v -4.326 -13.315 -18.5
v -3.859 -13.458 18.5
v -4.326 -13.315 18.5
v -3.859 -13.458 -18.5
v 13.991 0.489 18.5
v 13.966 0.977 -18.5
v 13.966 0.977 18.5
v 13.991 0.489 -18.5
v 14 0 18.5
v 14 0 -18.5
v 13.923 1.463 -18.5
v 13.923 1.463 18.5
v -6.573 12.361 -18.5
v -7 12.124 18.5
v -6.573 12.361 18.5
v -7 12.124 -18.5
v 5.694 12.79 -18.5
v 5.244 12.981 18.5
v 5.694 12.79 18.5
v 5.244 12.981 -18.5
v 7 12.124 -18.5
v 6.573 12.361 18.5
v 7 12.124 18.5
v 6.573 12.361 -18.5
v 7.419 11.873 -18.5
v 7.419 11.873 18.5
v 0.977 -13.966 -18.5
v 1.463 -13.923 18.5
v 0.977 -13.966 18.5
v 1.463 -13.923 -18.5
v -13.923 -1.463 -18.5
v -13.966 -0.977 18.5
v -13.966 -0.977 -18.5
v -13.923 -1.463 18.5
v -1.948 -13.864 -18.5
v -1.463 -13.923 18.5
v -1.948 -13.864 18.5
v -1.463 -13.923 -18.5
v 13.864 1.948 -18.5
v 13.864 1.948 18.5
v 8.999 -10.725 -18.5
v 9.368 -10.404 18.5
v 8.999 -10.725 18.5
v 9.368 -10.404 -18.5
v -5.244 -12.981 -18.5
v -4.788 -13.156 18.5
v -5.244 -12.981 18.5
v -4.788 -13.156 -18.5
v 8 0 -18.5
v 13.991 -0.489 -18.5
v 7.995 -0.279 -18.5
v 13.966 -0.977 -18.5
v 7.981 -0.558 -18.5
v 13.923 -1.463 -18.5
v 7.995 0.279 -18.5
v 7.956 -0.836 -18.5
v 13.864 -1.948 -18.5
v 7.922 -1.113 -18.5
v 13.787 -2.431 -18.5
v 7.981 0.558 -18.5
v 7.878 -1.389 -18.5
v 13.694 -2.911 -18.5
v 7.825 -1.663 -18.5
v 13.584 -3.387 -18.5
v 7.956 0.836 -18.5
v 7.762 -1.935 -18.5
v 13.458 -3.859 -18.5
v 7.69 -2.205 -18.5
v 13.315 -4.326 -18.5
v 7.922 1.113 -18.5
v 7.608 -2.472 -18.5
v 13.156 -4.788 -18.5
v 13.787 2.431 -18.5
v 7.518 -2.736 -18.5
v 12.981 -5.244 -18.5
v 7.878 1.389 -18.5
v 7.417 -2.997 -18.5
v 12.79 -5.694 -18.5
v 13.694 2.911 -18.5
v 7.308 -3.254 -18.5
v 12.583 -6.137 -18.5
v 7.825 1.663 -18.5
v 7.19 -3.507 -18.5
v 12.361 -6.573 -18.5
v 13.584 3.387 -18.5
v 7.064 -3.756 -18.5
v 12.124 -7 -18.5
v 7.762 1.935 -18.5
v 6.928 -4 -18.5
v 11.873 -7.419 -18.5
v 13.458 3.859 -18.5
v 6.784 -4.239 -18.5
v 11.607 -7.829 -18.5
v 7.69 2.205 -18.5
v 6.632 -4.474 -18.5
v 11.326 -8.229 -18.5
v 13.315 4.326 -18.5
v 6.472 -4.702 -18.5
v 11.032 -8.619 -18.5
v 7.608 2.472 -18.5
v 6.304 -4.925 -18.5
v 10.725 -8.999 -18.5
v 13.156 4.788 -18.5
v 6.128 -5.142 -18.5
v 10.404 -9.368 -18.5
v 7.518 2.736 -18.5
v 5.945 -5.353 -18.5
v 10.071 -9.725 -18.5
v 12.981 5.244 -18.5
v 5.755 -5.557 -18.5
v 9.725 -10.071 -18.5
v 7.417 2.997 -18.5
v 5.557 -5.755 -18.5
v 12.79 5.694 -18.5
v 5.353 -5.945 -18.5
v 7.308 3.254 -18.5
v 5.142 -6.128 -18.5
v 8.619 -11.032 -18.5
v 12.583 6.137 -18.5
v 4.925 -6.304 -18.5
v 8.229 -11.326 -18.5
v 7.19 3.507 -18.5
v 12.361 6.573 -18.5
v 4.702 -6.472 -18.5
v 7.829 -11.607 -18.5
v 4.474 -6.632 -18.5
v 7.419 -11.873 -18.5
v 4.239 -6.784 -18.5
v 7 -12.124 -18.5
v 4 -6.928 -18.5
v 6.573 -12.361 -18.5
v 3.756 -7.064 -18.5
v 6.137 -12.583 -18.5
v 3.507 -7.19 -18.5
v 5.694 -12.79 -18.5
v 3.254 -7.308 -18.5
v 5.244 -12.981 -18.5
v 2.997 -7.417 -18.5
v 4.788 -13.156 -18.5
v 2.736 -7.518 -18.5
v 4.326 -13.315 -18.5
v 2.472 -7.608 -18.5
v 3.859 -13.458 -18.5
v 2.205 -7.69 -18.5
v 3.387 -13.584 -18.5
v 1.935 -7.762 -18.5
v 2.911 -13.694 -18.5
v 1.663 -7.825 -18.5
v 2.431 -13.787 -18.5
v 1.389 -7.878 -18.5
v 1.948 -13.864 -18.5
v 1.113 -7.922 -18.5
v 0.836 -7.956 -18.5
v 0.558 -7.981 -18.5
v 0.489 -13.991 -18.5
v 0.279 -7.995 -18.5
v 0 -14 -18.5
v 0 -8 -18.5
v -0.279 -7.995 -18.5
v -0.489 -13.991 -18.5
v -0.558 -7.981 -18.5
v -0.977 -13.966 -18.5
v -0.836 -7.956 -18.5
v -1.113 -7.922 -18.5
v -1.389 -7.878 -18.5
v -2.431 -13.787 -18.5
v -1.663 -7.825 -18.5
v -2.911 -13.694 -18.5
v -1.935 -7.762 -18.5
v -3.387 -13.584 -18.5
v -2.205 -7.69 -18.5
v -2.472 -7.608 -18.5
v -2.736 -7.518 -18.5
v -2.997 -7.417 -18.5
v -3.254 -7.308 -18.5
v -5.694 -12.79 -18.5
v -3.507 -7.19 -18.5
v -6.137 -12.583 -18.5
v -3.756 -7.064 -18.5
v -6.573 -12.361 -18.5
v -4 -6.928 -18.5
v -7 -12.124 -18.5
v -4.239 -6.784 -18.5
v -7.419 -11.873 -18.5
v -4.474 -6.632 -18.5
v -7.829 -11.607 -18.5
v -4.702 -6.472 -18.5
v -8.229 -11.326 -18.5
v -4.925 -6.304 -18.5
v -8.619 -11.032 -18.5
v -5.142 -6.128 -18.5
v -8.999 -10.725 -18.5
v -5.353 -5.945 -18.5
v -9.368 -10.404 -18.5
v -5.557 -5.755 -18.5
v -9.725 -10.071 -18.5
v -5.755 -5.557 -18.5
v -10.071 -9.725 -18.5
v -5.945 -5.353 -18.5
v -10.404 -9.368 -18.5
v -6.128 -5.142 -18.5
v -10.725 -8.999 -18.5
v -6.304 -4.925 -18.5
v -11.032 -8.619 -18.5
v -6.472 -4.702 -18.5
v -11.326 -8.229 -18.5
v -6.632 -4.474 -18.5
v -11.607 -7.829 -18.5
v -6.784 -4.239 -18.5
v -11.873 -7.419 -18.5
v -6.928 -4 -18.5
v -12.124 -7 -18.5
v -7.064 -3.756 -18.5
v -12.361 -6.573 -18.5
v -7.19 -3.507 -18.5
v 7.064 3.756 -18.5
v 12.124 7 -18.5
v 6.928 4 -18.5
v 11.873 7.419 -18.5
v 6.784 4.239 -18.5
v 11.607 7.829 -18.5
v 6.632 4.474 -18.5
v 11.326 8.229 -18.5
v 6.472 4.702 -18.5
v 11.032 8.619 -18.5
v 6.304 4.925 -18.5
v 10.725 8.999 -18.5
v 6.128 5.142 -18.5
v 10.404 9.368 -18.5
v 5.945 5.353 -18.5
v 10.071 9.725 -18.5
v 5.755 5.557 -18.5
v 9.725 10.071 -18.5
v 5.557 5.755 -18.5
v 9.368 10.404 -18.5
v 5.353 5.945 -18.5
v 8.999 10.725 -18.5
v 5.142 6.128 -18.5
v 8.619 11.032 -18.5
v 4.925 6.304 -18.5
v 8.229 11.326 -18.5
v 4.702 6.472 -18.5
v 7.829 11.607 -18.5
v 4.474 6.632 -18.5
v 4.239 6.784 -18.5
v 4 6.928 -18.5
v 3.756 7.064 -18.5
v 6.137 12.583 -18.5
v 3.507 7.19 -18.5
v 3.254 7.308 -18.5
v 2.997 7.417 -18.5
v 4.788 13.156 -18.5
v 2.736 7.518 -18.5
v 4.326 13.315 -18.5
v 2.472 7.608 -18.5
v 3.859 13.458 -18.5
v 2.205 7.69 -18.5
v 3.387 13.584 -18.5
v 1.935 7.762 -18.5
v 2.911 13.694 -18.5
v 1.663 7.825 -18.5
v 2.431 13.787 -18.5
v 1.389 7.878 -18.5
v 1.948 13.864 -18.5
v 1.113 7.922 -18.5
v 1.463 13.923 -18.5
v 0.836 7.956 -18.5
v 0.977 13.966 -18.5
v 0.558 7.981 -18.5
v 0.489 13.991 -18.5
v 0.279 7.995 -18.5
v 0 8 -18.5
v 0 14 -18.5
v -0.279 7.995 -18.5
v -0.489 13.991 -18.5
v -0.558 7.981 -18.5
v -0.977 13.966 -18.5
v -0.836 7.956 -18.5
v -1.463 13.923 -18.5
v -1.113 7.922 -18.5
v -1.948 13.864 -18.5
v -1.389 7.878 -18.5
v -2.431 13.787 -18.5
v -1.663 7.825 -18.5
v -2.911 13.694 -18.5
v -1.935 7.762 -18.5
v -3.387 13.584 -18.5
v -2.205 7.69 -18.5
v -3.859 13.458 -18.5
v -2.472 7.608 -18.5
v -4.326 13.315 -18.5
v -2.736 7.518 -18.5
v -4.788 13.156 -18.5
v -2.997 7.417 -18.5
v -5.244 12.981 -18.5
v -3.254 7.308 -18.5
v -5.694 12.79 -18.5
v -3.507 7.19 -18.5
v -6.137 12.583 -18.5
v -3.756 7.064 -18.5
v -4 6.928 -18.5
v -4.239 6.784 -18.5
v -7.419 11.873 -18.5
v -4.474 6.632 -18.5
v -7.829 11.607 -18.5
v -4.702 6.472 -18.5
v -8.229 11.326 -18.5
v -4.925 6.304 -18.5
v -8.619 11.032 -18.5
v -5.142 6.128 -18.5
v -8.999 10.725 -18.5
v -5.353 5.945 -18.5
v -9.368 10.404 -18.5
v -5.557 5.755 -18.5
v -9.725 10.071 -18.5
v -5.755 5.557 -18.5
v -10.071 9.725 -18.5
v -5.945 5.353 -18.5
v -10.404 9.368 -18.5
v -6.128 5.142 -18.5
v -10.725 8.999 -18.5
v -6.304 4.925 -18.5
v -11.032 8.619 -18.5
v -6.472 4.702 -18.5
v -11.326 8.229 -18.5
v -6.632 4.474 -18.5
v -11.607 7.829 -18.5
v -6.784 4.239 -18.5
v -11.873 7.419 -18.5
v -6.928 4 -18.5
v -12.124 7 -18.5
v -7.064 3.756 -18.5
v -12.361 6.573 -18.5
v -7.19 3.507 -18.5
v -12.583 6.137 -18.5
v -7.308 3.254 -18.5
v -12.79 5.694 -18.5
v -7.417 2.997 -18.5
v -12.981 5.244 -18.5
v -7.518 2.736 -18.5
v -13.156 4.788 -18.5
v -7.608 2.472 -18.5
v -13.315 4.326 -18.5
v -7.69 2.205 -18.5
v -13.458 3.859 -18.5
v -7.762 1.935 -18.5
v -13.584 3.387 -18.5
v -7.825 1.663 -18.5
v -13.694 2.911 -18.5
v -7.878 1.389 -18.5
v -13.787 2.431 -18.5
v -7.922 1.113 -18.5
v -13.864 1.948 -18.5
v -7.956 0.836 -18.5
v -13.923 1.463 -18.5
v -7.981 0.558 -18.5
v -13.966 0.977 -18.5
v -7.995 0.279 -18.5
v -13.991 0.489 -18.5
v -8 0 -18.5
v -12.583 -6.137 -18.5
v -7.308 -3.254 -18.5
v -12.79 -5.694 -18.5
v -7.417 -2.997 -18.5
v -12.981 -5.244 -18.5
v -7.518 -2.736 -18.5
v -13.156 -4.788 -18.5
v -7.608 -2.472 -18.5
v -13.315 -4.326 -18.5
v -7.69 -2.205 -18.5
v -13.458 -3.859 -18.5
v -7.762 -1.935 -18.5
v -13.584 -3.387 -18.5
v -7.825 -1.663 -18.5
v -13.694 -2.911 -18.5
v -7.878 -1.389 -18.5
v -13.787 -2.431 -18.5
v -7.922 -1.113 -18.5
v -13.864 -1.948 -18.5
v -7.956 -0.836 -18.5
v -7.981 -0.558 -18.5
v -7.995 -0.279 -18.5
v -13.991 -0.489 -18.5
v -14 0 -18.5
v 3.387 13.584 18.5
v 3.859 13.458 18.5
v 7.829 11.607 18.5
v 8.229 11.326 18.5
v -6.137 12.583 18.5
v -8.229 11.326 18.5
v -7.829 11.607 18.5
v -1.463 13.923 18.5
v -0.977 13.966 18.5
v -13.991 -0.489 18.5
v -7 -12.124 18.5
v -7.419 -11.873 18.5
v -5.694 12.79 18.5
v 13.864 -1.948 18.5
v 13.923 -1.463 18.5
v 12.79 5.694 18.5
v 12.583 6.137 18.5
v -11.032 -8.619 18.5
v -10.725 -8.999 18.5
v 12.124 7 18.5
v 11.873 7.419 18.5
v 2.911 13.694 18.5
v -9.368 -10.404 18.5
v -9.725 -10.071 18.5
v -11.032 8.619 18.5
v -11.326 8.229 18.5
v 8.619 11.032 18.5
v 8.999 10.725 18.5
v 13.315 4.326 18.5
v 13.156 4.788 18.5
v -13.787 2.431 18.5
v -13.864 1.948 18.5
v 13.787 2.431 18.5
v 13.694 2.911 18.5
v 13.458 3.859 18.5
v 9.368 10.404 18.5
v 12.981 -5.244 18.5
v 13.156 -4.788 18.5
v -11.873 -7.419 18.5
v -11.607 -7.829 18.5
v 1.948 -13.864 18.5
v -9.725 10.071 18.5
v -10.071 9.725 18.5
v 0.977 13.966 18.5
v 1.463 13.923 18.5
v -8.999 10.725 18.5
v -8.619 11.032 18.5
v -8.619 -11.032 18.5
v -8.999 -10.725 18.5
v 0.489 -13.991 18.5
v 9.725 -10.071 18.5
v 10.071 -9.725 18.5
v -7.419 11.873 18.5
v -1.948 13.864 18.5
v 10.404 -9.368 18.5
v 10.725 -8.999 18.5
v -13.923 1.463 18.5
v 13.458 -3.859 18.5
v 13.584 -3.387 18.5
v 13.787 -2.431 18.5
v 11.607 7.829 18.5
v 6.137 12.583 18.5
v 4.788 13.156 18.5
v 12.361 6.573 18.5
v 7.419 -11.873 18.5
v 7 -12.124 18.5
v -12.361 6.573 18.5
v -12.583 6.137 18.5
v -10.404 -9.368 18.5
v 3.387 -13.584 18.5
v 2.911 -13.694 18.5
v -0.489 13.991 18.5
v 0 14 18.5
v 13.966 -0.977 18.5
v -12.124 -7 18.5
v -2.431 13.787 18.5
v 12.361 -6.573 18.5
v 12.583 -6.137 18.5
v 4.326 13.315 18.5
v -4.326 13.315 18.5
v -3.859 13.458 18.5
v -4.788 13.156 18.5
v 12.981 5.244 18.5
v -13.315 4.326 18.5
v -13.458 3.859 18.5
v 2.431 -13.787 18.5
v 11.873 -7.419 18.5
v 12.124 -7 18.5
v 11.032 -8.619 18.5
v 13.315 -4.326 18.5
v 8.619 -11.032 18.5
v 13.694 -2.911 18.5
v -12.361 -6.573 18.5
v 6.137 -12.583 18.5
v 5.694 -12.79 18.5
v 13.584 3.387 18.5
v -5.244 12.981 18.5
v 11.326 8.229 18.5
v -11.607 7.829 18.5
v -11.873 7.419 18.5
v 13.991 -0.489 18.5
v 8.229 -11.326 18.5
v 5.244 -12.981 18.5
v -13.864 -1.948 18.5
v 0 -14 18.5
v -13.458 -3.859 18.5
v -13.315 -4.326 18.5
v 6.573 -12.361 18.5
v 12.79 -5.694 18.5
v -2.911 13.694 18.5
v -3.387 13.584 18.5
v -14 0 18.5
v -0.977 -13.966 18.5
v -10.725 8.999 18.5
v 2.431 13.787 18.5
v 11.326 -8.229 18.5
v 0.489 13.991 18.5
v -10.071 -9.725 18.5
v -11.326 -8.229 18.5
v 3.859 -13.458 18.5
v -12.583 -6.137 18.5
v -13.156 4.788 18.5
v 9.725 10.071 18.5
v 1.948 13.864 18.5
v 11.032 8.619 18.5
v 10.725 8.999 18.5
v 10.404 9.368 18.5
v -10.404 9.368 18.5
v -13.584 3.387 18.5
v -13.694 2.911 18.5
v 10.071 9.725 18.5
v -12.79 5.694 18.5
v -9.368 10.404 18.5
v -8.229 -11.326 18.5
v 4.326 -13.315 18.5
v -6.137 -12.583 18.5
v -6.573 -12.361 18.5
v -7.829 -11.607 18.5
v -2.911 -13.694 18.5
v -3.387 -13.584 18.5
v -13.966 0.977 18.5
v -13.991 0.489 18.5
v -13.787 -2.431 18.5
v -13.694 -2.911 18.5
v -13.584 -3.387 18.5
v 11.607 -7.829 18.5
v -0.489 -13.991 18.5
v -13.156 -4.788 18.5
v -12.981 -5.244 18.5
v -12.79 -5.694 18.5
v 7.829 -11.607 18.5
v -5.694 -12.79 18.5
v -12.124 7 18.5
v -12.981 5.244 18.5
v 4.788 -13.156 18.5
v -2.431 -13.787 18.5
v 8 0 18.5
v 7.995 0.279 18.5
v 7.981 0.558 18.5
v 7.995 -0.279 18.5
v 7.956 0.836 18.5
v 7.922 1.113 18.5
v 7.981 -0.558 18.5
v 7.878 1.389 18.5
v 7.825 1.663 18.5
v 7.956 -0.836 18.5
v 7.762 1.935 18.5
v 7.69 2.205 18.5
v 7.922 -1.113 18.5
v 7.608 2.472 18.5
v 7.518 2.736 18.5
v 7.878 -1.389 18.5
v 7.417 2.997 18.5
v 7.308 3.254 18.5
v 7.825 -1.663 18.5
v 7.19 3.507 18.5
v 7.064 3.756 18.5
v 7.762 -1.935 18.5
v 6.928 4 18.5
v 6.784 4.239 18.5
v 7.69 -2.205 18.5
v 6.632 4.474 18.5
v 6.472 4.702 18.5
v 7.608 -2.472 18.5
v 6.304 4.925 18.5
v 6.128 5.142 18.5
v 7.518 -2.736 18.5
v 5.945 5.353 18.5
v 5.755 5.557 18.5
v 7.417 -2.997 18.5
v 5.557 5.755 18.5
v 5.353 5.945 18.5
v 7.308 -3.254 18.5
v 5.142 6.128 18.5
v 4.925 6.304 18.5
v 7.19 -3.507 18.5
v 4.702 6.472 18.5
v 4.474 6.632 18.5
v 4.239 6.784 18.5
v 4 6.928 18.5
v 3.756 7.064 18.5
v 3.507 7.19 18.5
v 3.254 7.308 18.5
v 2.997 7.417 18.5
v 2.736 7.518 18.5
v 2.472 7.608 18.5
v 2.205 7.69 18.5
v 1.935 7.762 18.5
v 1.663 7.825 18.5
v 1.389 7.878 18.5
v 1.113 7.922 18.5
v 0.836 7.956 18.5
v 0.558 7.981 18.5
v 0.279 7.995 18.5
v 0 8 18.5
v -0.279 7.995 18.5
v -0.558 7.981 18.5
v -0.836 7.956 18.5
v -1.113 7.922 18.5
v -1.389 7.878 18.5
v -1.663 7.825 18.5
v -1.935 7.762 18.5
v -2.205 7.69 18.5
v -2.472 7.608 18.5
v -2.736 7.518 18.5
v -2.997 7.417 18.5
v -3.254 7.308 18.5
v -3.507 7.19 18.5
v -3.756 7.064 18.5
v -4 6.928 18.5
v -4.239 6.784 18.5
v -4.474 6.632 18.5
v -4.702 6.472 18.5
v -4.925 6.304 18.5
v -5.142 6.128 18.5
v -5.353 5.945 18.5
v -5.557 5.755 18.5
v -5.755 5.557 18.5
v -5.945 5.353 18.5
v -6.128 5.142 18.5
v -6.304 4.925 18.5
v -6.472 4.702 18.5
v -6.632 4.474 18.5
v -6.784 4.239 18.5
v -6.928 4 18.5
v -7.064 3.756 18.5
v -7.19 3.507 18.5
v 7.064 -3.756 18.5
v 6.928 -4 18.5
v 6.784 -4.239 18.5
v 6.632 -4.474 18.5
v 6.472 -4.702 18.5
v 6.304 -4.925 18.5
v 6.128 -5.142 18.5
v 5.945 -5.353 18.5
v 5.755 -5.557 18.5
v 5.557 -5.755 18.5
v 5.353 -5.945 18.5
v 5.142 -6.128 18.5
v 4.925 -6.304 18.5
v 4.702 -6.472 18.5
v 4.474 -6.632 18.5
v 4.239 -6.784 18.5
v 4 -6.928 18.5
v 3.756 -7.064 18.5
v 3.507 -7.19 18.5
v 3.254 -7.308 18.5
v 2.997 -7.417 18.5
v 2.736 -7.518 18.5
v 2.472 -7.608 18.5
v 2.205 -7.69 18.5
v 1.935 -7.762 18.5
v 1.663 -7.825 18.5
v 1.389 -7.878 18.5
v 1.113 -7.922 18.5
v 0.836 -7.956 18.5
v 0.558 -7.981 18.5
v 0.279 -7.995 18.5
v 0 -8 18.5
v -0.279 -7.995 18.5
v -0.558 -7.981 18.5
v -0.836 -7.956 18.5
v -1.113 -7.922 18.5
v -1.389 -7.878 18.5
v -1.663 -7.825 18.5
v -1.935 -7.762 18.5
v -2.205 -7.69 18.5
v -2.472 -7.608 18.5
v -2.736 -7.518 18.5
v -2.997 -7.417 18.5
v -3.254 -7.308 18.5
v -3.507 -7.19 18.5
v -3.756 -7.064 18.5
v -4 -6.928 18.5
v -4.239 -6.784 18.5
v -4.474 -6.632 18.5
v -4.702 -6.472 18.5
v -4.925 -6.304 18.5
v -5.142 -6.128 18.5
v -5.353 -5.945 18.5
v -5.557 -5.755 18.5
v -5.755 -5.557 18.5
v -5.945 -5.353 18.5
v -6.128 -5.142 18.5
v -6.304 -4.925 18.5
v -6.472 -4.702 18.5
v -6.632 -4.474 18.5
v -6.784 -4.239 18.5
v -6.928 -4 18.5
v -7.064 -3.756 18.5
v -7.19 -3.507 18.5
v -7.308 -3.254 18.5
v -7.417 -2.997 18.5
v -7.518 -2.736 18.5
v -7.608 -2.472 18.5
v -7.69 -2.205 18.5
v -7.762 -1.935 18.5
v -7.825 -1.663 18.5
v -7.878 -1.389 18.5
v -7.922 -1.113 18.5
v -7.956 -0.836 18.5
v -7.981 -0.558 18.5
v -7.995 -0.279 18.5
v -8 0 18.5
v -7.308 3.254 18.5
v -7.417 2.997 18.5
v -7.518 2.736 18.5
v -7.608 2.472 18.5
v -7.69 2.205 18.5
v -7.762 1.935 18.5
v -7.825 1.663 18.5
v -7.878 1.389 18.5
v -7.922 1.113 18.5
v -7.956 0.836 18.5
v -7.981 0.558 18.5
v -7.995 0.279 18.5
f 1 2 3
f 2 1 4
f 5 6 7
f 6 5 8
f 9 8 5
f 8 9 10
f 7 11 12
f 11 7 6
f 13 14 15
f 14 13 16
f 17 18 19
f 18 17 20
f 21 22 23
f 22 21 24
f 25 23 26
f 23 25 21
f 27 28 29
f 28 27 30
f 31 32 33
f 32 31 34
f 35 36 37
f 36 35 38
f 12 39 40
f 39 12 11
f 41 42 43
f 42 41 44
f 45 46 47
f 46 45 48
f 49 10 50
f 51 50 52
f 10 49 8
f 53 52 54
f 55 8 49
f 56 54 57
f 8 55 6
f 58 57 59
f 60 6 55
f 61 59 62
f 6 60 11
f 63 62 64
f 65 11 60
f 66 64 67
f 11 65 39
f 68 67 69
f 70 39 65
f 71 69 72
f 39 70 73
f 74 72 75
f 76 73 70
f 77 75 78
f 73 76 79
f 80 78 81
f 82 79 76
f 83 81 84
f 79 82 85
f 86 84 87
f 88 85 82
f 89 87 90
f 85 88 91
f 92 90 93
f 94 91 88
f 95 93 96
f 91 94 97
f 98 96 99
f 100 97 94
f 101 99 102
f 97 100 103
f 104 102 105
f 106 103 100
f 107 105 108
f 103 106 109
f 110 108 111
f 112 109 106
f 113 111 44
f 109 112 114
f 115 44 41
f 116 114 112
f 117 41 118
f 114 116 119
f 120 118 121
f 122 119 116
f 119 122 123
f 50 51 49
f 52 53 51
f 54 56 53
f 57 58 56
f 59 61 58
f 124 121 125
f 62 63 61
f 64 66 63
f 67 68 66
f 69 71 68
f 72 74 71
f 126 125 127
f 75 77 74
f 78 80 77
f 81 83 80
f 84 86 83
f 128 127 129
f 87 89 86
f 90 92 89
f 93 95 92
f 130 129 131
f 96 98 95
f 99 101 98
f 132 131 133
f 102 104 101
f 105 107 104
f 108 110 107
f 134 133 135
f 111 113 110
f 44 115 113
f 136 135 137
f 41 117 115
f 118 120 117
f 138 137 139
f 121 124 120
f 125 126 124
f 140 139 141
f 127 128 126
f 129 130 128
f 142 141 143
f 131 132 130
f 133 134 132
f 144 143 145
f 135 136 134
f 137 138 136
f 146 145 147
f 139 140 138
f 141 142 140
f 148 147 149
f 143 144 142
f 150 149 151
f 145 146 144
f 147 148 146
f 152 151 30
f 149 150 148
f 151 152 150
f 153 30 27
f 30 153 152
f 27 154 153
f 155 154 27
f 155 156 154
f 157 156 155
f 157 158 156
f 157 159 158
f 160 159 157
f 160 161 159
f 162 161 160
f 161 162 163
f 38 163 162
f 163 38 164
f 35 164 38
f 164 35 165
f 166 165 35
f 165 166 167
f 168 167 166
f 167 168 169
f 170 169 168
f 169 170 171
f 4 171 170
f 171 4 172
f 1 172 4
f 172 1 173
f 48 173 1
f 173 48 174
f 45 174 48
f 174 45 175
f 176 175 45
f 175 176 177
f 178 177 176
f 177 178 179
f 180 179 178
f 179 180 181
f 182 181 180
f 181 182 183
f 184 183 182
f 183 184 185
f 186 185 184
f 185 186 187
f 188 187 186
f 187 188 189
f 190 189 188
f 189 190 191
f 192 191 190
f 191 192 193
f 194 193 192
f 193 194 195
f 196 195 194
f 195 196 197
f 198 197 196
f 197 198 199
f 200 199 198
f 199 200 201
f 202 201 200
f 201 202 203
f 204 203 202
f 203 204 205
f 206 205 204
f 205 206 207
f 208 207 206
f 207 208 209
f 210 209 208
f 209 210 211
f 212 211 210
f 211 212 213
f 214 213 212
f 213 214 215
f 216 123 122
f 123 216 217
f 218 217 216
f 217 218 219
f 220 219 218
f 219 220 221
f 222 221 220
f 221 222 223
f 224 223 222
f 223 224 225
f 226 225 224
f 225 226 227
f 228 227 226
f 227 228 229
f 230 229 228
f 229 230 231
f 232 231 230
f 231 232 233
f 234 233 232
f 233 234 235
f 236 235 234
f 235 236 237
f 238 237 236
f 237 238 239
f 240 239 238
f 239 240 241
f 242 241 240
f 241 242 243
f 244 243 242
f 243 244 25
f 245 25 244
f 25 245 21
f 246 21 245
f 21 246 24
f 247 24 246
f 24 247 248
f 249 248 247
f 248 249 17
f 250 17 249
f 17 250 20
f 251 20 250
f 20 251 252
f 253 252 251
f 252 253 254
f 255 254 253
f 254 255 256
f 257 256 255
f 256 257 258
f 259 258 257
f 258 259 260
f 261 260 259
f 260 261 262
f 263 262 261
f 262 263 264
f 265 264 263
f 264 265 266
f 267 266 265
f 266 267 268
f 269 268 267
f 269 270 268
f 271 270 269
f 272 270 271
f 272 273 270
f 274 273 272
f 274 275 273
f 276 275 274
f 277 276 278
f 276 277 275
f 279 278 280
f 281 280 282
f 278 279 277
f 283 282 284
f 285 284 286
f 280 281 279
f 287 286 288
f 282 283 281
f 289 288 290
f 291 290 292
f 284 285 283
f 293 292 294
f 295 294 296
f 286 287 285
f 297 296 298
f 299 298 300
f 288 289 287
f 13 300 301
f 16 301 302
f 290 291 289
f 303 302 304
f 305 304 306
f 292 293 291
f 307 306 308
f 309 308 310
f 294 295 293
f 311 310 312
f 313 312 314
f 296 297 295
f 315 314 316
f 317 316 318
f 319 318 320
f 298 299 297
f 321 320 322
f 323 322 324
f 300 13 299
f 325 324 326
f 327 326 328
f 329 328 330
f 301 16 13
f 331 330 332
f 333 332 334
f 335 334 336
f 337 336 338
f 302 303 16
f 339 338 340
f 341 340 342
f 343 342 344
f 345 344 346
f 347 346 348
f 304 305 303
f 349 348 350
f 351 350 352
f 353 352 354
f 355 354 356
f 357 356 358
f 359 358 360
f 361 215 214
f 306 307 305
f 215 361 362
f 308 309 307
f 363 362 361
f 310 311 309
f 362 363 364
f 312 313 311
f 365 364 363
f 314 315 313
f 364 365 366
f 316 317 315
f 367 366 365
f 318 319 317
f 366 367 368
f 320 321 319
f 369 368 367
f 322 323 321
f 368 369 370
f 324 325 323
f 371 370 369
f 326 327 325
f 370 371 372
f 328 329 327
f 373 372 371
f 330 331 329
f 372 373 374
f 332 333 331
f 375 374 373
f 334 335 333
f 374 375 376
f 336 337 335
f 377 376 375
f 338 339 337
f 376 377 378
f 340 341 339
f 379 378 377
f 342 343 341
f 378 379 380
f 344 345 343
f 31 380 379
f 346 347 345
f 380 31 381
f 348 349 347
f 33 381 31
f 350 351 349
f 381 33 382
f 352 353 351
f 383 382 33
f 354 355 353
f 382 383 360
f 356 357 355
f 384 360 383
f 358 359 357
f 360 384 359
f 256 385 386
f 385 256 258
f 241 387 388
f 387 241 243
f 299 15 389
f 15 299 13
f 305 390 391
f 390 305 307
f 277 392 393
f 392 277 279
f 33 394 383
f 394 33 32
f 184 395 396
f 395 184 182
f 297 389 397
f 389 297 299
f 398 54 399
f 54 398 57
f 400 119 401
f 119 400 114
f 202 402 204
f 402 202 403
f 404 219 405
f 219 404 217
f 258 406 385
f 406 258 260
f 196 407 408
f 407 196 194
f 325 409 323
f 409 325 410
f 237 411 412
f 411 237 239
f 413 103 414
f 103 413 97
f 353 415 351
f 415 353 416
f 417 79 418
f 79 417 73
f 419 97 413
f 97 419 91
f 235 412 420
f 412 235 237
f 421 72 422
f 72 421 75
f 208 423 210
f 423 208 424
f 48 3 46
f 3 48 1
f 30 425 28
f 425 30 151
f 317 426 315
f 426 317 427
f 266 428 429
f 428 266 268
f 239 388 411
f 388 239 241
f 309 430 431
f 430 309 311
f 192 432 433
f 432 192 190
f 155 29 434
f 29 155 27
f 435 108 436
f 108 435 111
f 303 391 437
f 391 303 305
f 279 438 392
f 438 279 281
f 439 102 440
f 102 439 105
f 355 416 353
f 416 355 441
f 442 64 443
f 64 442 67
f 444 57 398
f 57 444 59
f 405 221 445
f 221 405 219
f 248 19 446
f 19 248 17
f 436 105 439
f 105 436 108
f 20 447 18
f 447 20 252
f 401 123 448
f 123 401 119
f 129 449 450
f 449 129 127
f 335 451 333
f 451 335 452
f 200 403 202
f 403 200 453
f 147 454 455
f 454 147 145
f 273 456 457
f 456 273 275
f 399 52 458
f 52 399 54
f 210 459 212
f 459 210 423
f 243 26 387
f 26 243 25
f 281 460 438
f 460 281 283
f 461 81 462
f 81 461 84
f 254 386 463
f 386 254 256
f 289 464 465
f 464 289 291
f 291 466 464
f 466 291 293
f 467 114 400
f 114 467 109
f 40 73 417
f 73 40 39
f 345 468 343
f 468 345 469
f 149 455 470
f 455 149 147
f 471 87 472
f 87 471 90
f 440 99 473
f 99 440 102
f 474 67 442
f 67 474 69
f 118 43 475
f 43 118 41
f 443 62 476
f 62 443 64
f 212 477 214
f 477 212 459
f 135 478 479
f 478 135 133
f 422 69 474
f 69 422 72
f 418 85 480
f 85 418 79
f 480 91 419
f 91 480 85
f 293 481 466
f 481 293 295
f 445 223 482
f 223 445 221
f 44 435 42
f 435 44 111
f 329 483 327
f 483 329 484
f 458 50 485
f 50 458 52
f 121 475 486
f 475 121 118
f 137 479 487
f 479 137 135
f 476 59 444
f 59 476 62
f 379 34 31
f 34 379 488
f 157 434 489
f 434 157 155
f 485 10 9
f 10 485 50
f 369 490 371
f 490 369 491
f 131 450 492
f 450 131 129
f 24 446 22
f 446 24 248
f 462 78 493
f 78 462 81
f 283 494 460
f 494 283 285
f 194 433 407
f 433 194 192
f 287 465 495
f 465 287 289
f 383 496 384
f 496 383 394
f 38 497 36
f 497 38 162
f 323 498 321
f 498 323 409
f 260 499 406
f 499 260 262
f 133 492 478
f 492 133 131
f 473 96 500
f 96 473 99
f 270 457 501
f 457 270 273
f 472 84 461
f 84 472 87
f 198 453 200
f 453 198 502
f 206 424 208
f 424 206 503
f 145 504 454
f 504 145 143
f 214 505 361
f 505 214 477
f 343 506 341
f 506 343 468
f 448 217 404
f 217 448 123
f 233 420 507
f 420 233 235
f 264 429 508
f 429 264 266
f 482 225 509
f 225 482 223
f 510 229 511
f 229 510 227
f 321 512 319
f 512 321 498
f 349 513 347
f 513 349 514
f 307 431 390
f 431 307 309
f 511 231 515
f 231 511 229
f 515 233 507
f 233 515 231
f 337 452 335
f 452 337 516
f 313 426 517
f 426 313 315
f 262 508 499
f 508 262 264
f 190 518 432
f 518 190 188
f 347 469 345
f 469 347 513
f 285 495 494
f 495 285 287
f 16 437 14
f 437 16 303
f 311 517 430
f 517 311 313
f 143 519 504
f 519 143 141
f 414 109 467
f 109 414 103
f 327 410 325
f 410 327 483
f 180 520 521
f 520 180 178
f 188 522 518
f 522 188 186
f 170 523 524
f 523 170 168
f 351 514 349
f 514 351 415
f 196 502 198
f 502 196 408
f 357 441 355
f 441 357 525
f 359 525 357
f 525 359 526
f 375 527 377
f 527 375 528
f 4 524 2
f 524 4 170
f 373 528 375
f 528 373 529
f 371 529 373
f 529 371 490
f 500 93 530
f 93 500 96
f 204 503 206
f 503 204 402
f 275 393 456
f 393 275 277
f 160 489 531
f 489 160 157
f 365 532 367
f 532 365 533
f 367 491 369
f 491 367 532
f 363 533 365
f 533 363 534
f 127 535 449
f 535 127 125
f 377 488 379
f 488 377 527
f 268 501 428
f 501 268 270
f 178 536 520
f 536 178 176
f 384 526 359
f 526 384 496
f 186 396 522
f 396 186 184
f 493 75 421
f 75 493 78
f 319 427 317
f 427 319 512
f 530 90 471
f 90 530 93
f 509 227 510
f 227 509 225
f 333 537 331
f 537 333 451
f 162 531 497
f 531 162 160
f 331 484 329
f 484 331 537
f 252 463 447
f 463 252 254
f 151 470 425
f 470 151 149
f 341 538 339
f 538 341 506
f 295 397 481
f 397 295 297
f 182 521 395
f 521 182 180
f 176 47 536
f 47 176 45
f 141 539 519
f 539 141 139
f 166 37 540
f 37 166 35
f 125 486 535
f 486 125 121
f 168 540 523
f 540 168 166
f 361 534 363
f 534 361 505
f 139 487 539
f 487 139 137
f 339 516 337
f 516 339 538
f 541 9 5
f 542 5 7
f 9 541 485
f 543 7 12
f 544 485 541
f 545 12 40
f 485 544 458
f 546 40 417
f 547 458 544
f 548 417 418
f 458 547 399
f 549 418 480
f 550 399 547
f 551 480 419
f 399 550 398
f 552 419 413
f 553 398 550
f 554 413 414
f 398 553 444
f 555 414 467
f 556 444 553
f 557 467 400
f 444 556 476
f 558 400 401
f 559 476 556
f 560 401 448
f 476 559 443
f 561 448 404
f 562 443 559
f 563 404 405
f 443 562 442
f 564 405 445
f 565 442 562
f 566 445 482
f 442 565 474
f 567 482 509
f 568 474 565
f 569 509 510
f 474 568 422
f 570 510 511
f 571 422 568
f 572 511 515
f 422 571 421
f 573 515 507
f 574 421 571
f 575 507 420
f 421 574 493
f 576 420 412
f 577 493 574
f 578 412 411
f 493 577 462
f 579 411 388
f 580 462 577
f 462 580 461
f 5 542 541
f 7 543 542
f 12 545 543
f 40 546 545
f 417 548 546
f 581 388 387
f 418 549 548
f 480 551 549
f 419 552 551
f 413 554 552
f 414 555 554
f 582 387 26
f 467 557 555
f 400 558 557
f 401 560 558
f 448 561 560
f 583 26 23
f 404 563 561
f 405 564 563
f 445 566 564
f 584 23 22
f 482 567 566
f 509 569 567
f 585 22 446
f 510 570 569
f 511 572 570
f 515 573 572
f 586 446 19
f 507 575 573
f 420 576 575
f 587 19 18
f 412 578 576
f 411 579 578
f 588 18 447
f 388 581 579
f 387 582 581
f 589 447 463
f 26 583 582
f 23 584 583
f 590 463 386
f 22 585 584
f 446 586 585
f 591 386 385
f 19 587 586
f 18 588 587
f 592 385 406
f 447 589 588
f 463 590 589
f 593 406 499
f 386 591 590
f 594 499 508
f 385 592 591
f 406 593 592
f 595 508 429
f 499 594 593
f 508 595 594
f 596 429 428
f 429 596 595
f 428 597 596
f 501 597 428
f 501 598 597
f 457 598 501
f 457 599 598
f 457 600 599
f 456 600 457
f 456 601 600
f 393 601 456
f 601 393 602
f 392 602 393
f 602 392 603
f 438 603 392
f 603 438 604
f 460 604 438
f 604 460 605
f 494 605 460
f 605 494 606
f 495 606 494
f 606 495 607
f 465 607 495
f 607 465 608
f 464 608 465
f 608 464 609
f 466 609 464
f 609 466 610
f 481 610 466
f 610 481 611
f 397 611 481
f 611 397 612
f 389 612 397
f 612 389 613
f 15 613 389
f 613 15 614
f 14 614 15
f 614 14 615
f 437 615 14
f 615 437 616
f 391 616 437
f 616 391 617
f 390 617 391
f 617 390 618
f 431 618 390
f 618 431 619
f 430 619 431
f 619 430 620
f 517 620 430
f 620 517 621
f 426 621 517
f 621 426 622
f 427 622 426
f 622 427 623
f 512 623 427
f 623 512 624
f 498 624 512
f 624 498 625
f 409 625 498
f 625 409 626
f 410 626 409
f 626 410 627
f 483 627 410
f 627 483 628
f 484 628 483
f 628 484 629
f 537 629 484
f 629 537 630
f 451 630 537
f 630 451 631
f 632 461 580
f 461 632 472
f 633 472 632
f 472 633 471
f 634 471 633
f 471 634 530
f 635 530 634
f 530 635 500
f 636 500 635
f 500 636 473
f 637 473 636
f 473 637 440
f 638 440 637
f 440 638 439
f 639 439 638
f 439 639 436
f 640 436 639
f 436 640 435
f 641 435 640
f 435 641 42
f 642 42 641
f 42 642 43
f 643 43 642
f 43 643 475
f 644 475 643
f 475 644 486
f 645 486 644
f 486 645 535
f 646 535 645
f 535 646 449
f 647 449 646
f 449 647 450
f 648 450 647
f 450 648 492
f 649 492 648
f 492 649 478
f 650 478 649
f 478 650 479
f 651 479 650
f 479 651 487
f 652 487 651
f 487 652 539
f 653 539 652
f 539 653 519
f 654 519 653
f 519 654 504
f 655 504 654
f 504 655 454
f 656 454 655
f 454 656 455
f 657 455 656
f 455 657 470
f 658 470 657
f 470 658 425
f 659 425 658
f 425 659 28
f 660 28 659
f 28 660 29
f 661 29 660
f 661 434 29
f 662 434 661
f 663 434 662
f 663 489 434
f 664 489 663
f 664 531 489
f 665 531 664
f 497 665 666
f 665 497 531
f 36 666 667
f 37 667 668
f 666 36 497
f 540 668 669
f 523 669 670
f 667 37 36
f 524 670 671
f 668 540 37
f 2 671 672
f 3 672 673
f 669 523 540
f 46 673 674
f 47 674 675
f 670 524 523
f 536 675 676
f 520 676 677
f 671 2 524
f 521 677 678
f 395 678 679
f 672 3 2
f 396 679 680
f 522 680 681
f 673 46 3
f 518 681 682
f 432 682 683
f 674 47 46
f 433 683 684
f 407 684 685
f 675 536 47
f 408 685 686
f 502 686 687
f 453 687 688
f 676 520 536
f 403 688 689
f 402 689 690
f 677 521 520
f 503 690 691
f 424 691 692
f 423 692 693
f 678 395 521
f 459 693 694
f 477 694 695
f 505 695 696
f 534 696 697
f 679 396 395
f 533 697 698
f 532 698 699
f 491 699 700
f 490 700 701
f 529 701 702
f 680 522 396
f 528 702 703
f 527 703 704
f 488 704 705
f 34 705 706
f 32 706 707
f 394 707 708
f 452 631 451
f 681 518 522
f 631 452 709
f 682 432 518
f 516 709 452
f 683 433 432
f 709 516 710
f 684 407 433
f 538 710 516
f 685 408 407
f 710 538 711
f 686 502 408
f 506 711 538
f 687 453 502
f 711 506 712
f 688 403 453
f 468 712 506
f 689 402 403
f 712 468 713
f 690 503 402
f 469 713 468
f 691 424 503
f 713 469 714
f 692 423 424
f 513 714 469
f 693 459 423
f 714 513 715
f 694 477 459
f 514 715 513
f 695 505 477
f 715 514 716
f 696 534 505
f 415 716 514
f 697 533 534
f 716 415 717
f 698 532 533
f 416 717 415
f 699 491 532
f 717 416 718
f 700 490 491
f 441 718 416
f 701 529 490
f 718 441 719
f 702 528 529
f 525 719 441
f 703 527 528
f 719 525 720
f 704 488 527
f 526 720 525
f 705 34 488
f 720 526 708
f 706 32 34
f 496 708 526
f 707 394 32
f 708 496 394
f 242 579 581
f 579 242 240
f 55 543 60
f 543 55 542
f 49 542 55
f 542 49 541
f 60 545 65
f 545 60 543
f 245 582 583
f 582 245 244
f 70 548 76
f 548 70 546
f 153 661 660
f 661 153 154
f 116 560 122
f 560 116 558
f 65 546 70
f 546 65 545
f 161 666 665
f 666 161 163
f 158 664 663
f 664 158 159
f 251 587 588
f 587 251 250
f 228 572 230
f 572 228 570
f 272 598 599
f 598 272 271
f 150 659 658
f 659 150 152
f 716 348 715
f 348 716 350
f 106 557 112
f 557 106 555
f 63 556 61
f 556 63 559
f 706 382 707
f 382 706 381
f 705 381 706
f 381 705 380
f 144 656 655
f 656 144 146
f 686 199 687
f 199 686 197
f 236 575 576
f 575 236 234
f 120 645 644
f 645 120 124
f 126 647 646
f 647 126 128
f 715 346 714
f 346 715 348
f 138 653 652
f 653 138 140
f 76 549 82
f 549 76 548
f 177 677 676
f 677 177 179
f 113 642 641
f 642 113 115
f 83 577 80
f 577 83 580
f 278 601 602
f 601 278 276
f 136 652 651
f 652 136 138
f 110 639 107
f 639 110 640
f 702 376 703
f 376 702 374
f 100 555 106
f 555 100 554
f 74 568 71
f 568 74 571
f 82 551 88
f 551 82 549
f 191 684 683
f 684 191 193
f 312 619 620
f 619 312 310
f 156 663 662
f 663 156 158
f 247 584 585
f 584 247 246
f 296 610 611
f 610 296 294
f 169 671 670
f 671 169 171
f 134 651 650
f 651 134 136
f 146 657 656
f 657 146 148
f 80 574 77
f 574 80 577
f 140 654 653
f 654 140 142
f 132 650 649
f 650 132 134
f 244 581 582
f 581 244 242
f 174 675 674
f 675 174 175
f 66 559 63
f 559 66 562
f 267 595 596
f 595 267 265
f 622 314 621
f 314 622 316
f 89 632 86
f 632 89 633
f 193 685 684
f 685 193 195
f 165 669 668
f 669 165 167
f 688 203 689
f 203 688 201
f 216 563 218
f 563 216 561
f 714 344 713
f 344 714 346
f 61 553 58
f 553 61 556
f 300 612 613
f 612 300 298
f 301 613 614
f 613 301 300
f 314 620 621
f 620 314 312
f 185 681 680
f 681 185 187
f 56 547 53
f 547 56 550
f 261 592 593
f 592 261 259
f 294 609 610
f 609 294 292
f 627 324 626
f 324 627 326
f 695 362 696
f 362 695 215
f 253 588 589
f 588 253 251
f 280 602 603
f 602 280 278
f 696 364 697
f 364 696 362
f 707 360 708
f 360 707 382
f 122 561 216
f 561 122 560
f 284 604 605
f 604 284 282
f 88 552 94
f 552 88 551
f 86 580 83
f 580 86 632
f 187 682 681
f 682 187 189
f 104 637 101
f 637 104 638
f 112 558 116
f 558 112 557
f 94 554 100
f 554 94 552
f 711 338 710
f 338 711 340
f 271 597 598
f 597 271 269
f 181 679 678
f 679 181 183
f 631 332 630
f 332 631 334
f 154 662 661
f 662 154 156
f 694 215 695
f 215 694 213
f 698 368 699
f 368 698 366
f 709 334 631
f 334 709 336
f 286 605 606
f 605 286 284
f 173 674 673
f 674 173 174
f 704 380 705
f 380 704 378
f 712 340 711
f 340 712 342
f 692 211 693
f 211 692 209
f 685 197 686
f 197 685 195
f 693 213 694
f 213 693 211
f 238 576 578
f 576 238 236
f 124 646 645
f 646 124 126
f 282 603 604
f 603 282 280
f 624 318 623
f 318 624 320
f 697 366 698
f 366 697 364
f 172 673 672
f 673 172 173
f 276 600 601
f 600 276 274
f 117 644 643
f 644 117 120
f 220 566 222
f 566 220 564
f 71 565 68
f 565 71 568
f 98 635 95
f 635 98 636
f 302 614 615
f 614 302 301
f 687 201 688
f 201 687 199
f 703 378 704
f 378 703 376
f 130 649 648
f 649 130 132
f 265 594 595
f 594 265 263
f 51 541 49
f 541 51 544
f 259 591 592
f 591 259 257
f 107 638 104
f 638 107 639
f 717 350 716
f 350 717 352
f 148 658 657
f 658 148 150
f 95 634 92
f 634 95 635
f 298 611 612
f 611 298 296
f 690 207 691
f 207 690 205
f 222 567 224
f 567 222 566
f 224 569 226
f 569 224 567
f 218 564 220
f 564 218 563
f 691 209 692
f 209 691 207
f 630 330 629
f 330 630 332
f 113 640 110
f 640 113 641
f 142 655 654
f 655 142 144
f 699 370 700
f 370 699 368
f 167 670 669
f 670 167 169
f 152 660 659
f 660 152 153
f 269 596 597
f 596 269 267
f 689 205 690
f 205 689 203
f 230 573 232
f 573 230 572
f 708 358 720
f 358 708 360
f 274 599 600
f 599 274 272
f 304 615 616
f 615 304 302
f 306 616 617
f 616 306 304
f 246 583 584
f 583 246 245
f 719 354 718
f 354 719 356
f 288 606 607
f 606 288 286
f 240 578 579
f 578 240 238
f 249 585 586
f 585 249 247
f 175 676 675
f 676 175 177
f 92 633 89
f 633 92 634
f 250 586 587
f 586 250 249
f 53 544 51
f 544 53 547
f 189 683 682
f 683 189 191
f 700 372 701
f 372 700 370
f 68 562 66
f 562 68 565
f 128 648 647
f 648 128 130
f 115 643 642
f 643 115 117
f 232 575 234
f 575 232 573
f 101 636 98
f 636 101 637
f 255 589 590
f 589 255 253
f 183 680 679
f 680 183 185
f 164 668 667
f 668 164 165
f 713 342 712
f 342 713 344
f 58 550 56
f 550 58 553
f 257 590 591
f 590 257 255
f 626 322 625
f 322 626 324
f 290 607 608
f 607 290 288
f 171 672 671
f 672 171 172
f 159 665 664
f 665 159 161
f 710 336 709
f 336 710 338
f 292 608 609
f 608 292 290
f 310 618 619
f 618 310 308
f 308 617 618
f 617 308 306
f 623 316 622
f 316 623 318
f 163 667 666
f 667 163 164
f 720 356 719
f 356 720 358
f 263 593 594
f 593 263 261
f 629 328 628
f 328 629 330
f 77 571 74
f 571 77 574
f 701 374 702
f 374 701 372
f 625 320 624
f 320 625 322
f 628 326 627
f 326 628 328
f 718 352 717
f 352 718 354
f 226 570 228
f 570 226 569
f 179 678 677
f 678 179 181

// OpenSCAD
$fn = 180;

bore_d = 16.0;   // mm (ID)
od_d   = 28.0;   // mm (OD)
len    = 37.0;   // mm (overall length)

eps = 0.05;      // small overlap to avoid coplanar faces

difference() {
    // Outer body: exact OD and length, centered for easy verification
    cylinder(d = od_d, h = len, center = true);

    // Through bore: exact ID, extended slightly to guarantee a clean cut
    cylinder(d = bore_d, h = len + 2*eps, center = true);
}
